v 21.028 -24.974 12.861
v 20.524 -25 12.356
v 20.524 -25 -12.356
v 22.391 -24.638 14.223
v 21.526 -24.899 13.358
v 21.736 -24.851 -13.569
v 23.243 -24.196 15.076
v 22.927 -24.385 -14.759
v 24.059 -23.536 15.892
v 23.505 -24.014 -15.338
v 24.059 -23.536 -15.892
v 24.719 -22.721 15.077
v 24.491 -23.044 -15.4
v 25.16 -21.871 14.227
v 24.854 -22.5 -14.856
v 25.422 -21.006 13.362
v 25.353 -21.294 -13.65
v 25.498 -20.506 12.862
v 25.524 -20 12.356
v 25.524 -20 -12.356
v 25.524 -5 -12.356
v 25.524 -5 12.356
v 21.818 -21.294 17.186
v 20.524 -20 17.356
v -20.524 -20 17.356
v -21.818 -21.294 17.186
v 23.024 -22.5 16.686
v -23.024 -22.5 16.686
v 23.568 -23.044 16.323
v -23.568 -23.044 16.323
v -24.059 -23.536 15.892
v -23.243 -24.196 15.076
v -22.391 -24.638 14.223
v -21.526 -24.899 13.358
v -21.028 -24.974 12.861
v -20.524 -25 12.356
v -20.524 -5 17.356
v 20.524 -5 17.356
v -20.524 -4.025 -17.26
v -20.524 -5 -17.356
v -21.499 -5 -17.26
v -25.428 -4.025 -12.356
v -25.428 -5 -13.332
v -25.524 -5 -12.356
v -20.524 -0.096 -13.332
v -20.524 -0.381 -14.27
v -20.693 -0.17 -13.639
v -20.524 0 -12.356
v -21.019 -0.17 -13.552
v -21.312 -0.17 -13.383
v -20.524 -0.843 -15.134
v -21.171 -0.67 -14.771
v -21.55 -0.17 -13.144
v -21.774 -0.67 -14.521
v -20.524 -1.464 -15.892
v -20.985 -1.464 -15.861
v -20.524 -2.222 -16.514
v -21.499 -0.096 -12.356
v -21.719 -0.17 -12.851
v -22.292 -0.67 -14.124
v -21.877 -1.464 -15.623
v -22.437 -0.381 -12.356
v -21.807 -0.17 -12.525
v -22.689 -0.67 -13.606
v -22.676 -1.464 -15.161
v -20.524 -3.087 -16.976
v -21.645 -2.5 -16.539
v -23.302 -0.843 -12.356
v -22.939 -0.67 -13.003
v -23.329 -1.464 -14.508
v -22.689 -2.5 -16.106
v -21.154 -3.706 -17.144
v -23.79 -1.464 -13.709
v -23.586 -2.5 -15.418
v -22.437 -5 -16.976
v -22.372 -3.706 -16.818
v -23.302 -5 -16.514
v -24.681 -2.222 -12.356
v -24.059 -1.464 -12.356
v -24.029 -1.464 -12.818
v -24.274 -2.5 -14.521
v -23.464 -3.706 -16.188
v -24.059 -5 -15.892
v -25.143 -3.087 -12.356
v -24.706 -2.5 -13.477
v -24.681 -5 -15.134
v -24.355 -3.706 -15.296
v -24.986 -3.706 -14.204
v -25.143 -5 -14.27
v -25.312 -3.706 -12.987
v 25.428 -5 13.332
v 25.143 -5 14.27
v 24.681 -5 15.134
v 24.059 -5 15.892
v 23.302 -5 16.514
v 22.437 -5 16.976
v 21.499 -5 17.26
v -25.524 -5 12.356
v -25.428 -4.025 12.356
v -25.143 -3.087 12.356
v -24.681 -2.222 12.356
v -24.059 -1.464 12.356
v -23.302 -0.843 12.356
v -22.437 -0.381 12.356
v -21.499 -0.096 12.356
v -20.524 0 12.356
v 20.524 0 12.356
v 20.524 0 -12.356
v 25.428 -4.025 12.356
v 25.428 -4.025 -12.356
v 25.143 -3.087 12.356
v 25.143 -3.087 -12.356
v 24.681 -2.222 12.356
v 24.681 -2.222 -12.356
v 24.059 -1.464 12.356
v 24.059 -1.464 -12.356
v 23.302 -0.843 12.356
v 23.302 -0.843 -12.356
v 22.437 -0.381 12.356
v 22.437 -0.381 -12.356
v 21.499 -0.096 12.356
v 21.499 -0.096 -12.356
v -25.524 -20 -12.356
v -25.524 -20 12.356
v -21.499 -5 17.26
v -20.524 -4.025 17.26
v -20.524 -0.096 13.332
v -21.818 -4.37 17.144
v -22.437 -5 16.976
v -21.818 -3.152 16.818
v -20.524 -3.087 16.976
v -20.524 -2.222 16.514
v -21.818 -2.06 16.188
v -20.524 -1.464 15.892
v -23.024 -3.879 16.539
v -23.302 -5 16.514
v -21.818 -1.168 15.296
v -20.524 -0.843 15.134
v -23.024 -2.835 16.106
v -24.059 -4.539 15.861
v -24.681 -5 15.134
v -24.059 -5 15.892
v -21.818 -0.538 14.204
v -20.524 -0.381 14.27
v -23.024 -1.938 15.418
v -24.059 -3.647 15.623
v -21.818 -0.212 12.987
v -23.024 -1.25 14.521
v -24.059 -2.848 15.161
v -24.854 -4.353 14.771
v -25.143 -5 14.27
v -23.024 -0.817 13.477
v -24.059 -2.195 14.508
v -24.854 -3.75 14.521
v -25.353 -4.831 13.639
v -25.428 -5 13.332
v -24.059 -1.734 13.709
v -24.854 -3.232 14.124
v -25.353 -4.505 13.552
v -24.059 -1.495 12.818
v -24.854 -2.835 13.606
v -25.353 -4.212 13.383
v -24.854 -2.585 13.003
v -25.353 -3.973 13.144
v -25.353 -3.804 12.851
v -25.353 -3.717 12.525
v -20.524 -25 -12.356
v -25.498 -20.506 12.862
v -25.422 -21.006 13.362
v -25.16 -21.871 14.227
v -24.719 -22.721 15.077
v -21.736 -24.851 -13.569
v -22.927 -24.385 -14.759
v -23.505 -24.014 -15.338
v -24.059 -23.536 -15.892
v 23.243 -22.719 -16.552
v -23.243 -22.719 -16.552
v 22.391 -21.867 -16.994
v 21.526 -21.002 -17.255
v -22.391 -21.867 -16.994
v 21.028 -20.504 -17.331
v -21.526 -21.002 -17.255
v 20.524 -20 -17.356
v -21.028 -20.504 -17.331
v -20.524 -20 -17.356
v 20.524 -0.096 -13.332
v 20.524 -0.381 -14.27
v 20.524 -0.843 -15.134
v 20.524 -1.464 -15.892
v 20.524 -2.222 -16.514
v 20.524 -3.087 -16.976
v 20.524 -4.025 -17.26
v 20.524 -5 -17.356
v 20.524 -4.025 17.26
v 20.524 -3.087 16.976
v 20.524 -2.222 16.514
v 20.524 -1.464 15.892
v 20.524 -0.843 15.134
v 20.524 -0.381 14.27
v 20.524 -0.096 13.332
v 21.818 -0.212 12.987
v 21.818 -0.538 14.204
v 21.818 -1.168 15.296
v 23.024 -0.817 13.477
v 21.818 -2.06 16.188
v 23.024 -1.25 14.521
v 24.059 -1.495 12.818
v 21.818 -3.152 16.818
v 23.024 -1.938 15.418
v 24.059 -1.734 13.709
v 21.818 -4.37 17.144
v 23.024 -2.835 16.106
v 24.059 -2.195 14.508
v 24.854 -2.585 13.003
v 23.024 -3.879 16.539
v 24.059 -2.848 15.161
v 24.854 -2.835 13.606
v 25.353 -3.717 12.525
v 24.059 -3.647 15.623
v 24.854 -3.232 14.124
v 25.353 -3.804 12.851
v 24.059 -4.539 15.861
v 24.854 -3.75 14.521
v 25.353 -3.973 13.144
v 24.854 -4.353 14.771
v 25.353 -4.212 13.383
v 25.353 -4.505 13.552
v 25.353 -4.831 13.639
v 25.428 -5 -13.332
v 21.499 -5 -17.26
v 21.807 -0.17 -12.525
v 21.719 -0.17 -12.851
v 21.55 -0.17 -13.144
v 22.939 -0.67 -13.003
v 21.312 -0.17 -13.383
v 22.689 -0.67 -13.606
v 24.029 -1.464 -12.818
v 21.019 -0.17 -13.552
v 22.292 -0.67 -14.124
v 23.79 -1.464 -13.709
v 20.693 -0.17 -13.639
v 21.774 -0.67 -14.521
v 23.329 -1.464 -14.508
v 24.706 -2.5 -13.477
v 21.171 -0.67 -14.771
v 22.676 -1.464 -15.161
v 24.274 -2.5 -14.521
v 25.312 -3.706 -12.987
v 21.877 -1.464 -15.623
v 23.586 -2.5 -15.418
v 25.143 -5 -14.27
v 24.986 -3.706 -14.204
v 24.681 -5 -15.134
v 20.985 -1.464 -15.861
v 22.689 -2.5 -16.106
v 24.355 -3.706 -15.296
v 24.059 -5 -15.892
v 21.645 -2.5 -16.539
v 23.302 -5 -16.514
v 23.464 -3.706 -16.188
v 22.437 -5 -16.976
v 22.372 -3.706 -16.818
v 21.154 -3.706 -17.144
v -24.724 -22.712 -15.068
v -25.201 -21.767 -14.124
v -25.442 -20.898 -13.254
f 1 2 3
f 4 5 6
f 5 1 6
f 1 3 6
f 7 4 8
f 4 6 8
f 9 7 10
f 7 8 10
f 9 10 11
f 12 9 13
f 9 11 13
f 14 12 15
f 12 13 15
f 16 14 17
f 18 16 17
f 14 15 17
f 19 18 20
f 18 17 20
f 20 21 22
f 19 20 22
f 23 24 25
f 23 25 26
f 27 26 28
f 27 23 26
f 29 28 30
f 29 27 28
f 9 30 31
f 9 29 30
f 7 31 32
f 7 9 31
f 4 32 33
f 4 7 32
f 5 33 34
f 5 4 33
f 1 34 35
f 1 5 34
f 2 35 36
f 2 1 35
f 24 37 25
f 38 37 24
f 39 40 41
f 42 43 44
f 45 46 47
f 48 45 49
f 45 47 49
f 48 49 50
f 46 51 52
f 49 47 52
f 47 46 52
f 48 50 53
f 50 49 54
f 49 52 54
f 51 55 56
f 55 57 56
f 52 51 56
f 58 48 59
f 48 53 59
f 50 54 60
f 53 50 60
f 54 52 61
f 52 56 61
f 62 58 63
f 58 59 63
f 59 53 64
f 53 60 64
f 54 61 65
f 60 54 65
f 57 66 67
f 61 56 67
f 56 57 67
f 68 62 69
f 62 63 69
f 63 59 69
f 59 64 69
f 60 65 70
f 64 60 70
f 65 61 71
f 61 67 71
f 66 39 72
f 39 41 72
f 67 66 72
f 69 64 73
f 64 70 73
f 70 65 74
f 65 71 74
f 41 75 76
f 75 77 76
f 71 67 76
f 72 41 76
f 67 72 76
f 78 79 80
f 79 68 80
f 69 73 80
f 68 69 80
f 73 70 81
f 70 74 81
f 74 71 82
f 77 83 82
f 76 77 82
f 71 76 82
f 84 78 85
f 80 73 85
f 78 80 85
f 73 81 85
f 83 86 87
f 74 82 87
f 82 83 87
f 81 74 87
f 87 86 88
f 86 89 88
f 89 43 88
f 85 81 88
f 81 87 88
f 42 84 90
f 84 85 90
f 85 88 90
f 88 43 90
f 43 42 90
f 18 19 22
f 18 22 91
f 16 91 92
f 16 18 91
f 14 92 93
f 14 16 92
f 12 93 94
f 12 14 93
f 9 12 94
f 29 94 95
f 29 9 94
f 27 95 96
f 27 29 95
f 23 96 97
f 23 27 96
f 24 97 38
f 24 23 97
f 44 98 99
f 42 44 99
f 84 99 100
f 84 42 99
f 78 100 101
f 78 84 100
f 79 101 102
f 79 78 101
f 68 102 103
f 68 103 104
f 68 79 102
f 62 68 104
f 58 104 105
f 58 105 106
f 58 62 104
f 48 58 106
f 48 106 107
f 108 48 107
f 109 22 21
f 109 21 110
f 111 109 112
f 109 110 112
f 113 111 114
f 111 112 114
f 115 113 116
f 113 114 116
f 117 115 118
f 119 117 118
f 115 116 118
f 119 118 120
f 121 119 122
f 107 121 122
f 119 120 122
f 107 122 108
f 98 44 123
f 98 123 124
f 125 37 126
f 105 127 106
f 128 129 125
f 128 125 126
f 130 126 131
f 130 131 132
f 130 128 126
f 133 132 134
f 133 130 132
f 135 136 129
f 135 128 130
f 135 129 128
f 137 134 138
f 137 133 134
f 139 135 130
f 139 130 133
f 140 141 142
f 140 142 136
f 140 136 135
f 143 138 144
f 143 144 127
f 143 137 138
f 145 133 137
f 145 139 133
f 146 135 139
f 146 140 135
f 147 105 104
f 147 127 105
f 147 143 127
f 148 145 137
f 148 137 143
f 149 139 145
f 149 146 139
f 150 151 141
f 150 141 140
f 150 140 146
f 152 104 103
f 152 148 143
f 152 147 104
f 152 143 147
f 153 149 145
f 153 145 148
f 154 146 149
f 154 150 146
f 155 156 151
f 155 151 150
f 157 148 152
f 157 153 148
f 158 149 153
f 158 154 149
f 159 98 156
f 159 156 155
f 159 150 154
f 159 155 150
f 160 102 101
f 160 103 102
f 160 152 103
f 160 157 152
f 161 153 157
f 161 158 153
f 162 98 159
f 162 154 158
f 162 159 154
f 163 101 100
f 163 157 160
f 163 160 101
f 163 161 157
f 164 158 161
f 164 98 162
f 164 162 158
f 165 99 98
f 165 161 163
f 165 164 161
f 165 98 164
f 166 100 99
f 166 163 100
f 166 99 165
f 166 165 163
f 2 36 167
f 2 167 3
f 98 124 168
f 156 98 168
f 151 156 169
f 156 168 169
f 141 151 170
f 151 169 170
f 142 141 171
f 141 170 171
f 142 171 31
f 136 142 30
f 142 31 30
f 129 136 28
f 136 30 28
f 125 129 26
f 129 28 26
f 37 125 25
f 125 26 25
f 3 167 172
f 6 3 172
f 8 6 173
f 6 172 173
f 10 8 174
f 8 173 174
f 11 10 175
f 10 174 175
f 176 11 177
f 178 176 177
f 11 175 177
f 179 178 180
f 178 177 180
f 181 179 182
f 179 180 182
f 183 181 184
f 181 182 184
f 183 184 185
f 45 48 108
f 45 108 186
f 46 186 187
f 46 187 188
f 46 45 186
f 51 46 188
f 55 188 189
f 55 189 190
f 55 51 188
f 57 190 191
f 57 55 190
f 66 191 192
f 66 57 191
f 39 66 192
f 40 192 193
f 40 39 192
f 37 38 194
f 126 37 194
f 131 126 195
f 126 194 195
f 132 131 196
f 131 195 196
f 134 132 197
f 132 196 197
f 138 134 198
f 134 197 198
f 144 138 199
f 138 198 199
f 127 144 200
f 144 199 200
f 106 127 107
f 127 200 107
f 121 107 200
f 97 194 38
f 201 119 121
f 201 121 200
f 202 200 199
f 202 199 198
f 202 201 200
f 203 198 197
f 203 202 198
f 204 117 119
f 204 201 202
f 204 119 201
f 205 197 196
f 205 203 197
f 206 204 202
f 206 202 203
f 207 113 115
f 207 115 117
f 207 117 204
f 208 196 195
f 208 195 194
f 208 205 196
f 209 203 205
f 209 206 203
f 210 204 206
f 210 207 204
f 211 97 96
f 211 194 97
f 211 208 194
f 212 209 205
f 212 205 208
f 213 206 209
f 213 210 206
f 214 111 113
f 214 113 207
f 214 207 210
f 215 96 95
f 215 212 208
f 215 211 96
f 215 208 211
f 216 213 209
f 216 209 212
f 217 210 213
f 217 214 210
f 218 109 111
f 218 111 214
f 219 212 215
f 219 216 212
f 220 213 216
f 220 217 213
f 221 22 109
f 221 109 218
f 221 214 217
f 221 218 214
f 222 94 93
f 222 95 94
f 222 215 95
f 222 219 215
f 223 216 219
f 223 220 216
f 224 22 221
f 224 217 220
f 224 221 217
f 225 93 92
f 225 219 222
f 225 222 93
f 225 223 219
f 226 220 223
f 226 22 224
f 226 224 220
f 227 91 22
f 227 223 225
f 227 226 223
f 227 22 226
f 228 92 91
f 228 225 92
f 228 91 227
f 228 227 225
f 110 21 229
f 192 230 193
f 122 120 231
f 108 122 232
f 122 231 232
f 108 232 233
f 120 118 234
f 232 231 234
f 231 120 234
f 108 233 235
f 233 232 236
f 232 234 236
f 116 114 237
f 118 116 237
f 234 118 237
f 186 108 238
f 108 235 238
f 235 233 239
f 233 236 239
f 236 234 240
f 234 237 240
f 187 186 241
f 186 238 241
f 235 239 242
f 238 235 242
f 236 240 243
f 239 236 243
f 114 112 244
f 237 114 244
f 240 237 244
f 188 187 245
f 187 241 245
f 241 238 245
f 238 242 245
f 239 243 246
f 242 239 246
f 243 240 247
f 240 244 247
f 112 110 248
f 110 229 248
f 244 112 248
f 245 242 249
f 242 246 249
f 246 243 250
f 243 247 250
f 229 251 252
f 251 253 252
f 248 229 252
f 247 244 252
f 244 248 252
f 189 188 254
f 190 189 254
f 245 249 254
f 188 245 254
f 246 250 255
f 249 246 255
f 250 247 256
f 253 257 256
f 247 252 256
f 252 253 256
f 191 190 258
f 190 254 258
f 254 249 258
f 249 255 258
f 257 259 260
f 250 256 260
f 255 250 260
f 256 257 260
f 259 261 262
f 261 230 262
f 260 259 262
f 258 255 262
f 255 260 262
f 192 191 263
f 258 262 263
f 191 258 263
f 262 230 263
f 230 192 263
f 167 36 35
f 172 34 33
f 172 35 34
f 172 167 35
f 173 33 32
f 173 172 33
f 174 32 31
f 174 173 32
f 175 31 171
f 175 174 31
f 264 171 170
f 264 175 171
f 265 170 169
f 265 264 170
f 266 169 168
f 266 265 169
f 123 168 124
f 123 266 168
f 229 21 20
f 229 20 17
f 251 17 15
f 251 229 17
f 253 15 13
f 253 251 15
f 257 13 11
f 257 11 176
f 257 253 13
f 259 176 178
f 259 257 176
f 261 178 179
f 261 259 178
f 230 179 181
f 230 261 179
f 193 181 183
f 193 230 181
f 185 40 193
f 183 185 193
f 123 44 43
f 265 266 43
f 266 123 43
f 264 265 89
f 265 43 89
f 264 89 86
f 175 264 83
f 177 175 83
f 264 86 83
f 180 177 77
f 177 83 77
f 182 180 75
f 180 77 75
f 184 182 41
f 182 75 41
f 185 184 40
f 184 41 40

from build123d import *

# Parameters (mm, degrees)
F0_W         = 51.0475635529
F0_H         = 34.7123146057
F1_DEPTH     = 25
F2_R         = 5
F3_T1_DEPTH  = 50
F3_T3_DEPTH  = 76.0475635529
F4_T1_DEPTH  = 41.0475635528
F4_T3_DEPTH  = 24.7123146058
F4_S7_W      = 5
F4_S7_H      = 5
F4_T8_DEPTH  = 5
F4_S13_W     = 5
F4_S13_H     = 5
F4_T14_DEPTH = 5
F4_T18_ANGLE = 90.0000000014
F4_T20_ANGLE = 90.0000000014
F5_T1_DEPTH  = 49.7123146058


# Not quite as in the source:
# - a fillet or chamfer that OpenCascade refuses, or shapes differently, is made with other operations: its cross-section is extruded or revolved along the edge and cut away or added


with BuildPart() as f1:
    # F0 (on Front) → F1 (new body)
    with BuildSketch(Plane.XZ):
        Rectangle(F0_W, F0_H)
    extrude(amount=F1_DEPTH)

    # F2
    f2_edges = [f1.edges().sort_by_distance(p)[0] for p in [
        (0, -25, 17.356157),
        (0, 0, 17.356157),
        (-25.523782, -12.5, 17.356157),
        (25.523782, -12.5, 17.356157),
    ]]
    fillet(f2_edges, radius=F2_R)

    # F3: fillet of radius 5 on 4 edges, made by hand

    # F3_s2 → F3_t1 (cut)
    with BuildSketch(Plane.XZ.offset(-12.5)):
        with BuildLine():
            ThreePointArc((-25.5237817764, -12.3561573029), (-24.0593156824, -15.8916912088), (-20.5237817764, -17.3561573029))
            Line((-20.5237817764, -17.3561573029), (-25.5237817764, -17.3561573029))
            Line((-25.5237817764, -17.3561573029), (-25.5237817764, -12.3561573029))
        make_face()
        with BuildLine():
            ThreePointArc((25.5237817764, -12.3561573029), (24.0593156824, -15.8916912088), (20.5237817764, -17.3561573029))
            Line((20.5237817764, -17.3561573029), (25.5237817764, -17.3561573029))
            Line((25.5237817764, -17.3561573029), (25.5237817764, -12.3561573029))
        make_face()
    extrude(amount=F3_T1_DEPTH, mode=Mode.SUBTRACT)

    # F3_s4 → F3_t3 (cut)
    with BuildSketch(Plane.YZ.offset(-38.0237817764)):
        with BuildLine():
            ThreePointArc((-25, -12.3561573029), (-23.5355339059, -15.8916912088), (-20, -17.3561573029))
            Line((-20, -17.3561573029), (-25, -17.3561573029))
            Line((-25, -17.3561573029), (-25, -12.3561573029))
        make_face()
    extrude(amount=F3_T3_DEPTH, mode=Mode.SUBTRACT)

    # F4: fillet of radius 5 on 3 edges, made by hand

    # F4_s2 → F4_t1 (cut)
    with BuildSketch(Plane.YZ.offset(-20.5237817764)):
        with BuildLine():
            ThreePointArc((0, -12.3561573029), (-1.4644660941, -15.8916912088), (-5, -17.3561573029))
            Line((-5, -17.3561573029), (0, -17.3561573029))
            Line((0, -17.3561573029), (0, -12.3561573029))
        make_face()
    extrude(amount=F4_T1_DEPTH, mode=Mode.SUBTRACT)

    # F4_s4 → F4_t3 (cut)
    with BuildSketch(Plane.XY.offset(-12.3561573029)):
        with BuildLine():
            ThreePointArc((25.5237817764, -5), (24.0593156824, -1.4644660941), (20.5237817764, 0))
            Line((20.5237817764, 0), (25.5237817764, 0))
            Line((25.5237817764, 0), (25.5237817764, -5))
        make_face()
        with BuildLine():
            ThreePointArc((-25.5237817764, -5), (-24.0593156824, -1.4644660941), (-20.5237817764, 0))
            Line((-20.5237817764, 0), (-25.5237817764, 0))
            Line((-25.5237817764, 0), (-25.5237817764, -5))
        make_face()
    extrude(amount=F4_T3_DEPTH, mode=Mode.SUBTRACT)


with BuildPart() as f4_tool6:
    # F4_s7 → F4_t8 (new body)
    with BuildSketch(Plane.YZ.offset(20.5237817764)):
        with Locations((-2.5, 14.8561573029)):
            Rectangle(F4_S7_W, F4_S7_H)
    extrude(amount=F4_T8_DEPTH)

    # F4_s9 → F4_t10 (revolve, cut)
    with BuildSketch(Plane(origin=(20.5237817764, -5, 12.3561573029), x_dir=(0, -0.7071067812, -0.7071067812), z_dir=(0, -0.7071067812, 0.7071067812))):
        with BuildLine():
            ThreePointArc((0, -5), (5, 0), (0, 5))
            Line((0, 5), (0, -5))
        make_face()
    revolve(axis=Axis((20.5237817764, -5, 12.3561573029), (1, 0, 0)), mode=Mode.SUBTRACT)


with BuildPart() as f1_1:
    add(f1.part)

    # F4_t5: cut F4_tool6
    add(f4_tool6.part, mode=Mode.SUBTRACT)


with BuildPart() as f4_tool12:
    # F4_s13 → F4_t14 (new body)
    with BuildSketch(Plane.YZ.offset(-20.5237817764)):
        with Locations((-2.5, 14.8561573029)):
            Rectangle(F4_S13_W, F4_S13_H)
    extrude(amount=-F4_T14_DEPTH)

    # F4_s15 → F4_t16 (revolve, cut)
    with BuildSketch(Plane(origin=(-20.5237817764, -5, 12.3561573029), x_dir=(0, -0.7071067812, -0.7071067812), z_dir=(0, 0.7071067812, -0.7071067812))):
        with BuildLine():
            ThreePointArc((0, -5), (5, 0), (0, 5))
            Line((0, 5), (0, -5))
        make_face()
    revolve(axis=Axis((-20.5237817764, -5, 12.3561573029), (-1, 0, 0)), mode=Mode.SUBTRACT)


with BuildPart() as f1_2:
    add(f1_1.part)

    # F4_t11: cut F4_tool12
    add(f4_tool12.part, mode=Mode.SUBTRACT)

    # F4_s17 → F4_t18 (revolve, cut)
    with BuildSketch(Plane.YZ.offset(-20.5237817765)):
        with BuildLine():
            ThreePointArc((0, -12.3561573029), (-1.4644660941, -15.8916912088), (-5, -17.3561573029))
            Line((-5, -17.3561573029), (0, -17.3561573029))
            Line((0, -17.3561573029), (0, -12.3561573029))
        make_face()
    revolve(axis=Axis((-20.5237817765, 0, -12.356157303), (0, 1, 0)), revolution_arc=F4_T18_ANGLE, mode=Mode.SUBTRACT)

    # F4_s19 → F4_t20 (revolve, cut)
    with BuildSketch(Plane.XY.offset(-12.356157303)):
        with BuildLine():
            ThreePointArc((20.5237817764, 0), (24.0593156823, -1.4644660941), (25.5237817764, -5))
            Line((25.5237817764, -5), (25.5237817764, 0))
            Line((25.5237817764, 0), (20.5237817764, 0))
        make_face()
    revolve(axis=Axis((20.5237817765, 0, -12.356157303), (0, 1, 0)), revolution_arc=F4_T20_ANGLE, mode=Mode.SUBTRACT)

    # F5: fillet of radius 5 on 4 edges, made by hand

    # F5_s2 → F5_t1 (cut)
    with BuildSketch(Plane.XY.offset(-24.8561573029)):
        with BuildLine():
            ThreePointArc((20.5237817764, -25), (24.0593156824, -23.5355339059), (25.5237817764, -20))
            Line((25.5237817764, -20), (25.5237817764, -25))
            Line((25.5237817764, -25), (20.5237817764, -25))
        make_face()
        with BuildLine():
            ThreePointArc((-20.5237817764, -25), (-24.0593156824, -23.5355339059), (-25.5237817764, -20))
            Line((-25.5237817764, -20), (-25.5237817764, -25))
            Line((-25.5237817764, -25), (-20.5237817764, -25))
        make_face()
    extrude(amount=F5_T1_DEPTH, mode=Mode.SUBTRACT)


solid = f1_2.part
